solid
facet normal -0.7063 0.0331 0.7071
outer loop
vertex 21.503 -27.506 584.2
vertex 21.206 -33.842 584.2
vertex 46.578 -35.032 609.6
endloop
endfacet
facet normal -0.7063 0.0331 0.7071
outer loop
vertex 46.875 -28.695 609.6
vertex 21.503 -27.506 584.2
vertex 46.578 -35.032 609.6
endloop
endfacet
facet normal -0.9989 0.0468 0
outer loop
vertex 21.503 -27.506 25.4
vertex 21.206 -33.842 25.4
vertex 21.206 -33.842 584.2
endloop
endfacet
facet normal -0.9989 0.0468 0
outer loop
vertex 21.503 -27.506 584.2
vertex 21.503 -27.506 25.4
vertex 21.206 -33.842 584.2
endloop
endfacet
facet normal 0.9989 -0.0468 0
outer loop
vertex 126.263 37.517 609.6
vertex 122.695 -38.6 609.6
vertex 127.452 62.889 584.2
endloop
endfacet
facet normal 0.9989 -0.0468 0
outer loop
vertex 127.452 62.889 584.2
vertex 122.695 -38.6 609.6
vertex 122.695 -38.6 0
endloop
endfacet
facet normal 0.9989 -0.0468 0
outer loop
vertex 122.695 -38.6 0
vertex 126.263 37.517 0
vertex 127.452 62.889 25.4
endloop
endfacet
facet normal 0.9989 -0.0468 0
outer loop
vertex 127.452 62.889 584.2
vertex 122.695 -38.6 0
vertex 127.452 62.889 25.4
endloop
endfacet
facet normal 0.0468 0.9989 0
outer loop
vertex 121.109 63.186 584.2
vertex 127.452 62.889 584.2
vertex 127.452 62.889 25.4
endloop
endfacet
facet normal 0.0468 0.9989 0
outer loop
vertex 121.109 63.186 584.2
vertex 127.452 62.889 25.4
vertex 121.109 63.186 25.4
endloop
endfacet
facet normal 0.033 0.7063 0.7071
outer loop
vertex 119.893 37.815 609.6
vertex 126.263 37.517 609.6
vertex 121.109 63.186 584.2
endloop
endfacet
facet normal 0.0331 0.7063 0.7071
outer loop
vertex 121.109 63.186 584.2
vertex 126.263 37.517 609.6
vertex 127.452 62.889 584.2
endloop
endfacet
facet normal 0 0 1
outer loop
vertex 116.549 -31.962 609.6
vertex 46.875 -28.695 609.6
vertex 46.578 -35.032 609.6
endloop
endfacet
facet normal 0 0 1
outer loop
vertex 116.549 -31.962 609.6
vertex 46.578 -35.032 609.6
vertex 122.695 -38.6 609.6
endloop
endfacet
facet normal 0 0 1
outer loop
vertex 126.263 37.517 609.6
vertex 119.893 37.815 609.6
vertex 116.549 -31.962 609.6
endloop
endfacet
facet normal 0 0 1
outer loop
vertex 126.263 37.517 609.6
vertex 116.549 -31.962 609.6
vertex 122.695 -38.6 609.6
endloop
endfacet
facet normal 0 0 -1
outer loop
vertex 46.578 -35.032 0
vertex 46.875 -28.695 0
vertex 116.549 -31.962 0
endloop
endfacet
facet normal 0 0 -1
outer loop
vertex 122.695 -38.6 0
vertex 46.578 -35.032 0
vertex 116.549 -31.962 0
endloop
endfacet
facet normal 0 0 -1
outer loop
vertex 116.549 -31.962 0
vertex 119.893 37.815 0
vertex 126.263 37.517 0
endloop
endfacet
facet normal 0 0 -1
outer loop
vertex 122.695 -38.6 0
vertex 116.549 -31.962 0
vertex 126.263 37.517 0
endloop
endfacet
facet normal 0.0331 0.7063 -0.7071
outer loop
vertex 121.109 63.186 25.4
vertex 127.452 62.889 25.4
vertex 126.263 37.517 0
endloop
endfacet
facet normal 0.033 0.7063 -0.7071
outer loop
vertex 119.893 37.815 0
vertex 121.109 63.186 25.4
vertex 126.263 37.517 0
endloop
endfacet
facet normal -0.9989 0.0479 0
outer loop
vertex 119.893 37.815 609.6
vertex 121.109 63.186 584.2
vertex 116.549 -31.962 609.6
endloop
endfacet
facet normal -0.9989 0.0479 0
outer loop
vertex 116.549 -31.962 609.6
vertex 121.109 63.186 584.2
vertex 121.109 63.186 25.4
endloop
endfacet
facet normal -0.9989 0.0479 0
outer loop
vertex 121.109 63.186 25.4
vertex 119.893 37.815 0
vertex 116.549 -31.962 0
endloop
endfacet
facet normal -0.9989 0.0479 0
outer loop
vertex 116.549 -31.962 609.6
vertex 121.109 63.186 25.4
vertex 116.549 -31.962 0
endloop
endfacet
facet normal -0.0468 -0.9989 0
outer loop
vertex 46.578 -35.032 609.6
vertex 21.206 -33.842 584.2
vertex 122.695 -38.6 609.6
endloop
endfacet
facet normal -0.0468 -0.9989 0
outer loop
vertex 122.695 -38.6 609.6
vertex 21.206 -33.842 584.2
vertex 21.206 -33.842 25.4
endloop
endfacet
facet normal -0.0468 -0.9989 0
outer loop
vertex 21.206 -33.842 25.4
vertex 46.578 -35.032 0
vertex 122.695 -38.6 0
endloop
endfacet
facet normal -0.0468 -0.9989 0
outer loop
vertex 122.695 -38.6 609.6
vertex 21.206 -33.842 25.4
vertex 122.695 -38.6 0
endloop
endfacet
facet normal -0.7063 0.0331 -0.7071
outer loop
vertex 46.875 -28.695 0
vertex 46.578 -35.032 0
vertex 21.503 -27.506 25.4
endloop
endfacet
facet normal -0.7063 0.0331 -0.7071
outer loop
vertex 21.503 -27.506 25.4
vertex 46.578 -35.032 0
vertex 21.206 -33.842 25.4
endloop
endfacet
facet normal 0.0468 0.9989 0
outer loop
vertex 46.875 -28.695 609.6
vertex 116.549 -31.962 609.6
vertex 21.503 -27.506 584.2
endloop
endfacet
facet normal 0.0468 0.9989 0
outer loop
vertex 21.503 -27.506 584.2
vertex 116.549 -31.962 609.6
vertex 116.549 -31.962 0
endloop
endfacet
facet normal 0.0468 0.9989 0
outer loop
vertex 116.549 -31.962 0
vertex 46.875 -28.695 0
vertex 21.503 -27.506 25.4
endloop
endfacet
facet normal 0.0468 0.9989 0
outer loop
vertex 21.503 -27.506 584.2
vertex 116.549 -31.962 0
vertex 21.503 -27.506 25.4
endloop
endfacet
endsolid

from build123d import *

# Parameters (mm, degrees)
F1_DEPTH   = 609.6
F3_DEPTH   = 25.4
F1_FACE2_W = 6.35
F1_FACE2_H = 609.6
F5_DEPTH   = 25.4
F7_DEPTH   = 25.4
F9_DEPTH   = 25.4


with BuildPart() as f1:
    # F0 (on Top) → F1 (new body)
    with BuildSketch(Plane.XY):
        Polygon((21.206026165, -27.4921420044), (21.206026165, -33.8421420044), (122.6945791882, -38.5996208804), (127.4520580641, 62.8889321428), (121.1090235002, 63.1862745726), (116.5493069378, -31.9615489545), align=None)
    extrude(amount=F1_DEPTH)

    # F2 (on face) → F3 (cut)
    with BuildSketch(Plane(origin=(124.2310217623, -5.8235775776, 0), x_dir=(0.0468255795, 0.9989030809, 0), z_dir=(0.9989030809, -0.0468255795, 0))):
        Polygon((43.3879645501, 609.6), (68.7879645501, 584.2), (68.7879645501, 609.6), align=None)
    extrude(amount=-F3_DEPTH, mode=Mode.SUBTRACT)

    # F4 (on face) + F1_face2 (on face) → F5 (cut)
    with BuildSketch(Plane(origin=(-1.5364425741, -32.7760433027, 0), x_dir=(0.9989030809, -0.0468255795, 0), z_dir=(-0.0468255795, -0.9989030809, 0))):
        Polygon((22.7674427811, 584.2), (48.1674427811, 609.6), (22.7674427811, 609.6), align=None)
    with BuildSketch(Plane(origin=(21.206026165, -30.6671420044, 304.8), x_dir=(0, -1, 0), z_dir=(-1, 0, 0))):
        Rectangle(F1_FACE2_W, F1_FACE2_H)
    extrude(amount=-F5_DEPTH, dir=(-0.0468255795, -0.9989030809, 0), mode=Mode.SUBTRACT)

    # F6 (on face) → F7 (cut)
    with BuildSketch(Plane(origin=(-1.5364425741, -32.7760433027, 0), x_dir=(0.9989030809, -0.0468255795, 0), z_dir=(-0.0468255795, -0.9989030809, 0))):
        Polygon((48.1674427811, 0), (22.7674427811, 25.4), (22.7674427811, 0), align=None)
    extrude(amount=-F7_DEPTH, mode=Mode.SUBTRACT)

    # F8 (on face) → F9 (cut)
    with BuildSketch(Plane(origin=(124.2310217623, -5.8235775776, 0), x_dir=(0.0468255795, 0.9989030809, 0), z_dir=(0.9989030809, -0.0468255795, 0))):
        Polygon((68.7879645501, 25.4), (43.3879645501, 0), (68.7879645501, 0), align=None)
    extrude(amount=-F9_DEPTH, mode=Mode.SUBTRACT)


solid = f1.part
